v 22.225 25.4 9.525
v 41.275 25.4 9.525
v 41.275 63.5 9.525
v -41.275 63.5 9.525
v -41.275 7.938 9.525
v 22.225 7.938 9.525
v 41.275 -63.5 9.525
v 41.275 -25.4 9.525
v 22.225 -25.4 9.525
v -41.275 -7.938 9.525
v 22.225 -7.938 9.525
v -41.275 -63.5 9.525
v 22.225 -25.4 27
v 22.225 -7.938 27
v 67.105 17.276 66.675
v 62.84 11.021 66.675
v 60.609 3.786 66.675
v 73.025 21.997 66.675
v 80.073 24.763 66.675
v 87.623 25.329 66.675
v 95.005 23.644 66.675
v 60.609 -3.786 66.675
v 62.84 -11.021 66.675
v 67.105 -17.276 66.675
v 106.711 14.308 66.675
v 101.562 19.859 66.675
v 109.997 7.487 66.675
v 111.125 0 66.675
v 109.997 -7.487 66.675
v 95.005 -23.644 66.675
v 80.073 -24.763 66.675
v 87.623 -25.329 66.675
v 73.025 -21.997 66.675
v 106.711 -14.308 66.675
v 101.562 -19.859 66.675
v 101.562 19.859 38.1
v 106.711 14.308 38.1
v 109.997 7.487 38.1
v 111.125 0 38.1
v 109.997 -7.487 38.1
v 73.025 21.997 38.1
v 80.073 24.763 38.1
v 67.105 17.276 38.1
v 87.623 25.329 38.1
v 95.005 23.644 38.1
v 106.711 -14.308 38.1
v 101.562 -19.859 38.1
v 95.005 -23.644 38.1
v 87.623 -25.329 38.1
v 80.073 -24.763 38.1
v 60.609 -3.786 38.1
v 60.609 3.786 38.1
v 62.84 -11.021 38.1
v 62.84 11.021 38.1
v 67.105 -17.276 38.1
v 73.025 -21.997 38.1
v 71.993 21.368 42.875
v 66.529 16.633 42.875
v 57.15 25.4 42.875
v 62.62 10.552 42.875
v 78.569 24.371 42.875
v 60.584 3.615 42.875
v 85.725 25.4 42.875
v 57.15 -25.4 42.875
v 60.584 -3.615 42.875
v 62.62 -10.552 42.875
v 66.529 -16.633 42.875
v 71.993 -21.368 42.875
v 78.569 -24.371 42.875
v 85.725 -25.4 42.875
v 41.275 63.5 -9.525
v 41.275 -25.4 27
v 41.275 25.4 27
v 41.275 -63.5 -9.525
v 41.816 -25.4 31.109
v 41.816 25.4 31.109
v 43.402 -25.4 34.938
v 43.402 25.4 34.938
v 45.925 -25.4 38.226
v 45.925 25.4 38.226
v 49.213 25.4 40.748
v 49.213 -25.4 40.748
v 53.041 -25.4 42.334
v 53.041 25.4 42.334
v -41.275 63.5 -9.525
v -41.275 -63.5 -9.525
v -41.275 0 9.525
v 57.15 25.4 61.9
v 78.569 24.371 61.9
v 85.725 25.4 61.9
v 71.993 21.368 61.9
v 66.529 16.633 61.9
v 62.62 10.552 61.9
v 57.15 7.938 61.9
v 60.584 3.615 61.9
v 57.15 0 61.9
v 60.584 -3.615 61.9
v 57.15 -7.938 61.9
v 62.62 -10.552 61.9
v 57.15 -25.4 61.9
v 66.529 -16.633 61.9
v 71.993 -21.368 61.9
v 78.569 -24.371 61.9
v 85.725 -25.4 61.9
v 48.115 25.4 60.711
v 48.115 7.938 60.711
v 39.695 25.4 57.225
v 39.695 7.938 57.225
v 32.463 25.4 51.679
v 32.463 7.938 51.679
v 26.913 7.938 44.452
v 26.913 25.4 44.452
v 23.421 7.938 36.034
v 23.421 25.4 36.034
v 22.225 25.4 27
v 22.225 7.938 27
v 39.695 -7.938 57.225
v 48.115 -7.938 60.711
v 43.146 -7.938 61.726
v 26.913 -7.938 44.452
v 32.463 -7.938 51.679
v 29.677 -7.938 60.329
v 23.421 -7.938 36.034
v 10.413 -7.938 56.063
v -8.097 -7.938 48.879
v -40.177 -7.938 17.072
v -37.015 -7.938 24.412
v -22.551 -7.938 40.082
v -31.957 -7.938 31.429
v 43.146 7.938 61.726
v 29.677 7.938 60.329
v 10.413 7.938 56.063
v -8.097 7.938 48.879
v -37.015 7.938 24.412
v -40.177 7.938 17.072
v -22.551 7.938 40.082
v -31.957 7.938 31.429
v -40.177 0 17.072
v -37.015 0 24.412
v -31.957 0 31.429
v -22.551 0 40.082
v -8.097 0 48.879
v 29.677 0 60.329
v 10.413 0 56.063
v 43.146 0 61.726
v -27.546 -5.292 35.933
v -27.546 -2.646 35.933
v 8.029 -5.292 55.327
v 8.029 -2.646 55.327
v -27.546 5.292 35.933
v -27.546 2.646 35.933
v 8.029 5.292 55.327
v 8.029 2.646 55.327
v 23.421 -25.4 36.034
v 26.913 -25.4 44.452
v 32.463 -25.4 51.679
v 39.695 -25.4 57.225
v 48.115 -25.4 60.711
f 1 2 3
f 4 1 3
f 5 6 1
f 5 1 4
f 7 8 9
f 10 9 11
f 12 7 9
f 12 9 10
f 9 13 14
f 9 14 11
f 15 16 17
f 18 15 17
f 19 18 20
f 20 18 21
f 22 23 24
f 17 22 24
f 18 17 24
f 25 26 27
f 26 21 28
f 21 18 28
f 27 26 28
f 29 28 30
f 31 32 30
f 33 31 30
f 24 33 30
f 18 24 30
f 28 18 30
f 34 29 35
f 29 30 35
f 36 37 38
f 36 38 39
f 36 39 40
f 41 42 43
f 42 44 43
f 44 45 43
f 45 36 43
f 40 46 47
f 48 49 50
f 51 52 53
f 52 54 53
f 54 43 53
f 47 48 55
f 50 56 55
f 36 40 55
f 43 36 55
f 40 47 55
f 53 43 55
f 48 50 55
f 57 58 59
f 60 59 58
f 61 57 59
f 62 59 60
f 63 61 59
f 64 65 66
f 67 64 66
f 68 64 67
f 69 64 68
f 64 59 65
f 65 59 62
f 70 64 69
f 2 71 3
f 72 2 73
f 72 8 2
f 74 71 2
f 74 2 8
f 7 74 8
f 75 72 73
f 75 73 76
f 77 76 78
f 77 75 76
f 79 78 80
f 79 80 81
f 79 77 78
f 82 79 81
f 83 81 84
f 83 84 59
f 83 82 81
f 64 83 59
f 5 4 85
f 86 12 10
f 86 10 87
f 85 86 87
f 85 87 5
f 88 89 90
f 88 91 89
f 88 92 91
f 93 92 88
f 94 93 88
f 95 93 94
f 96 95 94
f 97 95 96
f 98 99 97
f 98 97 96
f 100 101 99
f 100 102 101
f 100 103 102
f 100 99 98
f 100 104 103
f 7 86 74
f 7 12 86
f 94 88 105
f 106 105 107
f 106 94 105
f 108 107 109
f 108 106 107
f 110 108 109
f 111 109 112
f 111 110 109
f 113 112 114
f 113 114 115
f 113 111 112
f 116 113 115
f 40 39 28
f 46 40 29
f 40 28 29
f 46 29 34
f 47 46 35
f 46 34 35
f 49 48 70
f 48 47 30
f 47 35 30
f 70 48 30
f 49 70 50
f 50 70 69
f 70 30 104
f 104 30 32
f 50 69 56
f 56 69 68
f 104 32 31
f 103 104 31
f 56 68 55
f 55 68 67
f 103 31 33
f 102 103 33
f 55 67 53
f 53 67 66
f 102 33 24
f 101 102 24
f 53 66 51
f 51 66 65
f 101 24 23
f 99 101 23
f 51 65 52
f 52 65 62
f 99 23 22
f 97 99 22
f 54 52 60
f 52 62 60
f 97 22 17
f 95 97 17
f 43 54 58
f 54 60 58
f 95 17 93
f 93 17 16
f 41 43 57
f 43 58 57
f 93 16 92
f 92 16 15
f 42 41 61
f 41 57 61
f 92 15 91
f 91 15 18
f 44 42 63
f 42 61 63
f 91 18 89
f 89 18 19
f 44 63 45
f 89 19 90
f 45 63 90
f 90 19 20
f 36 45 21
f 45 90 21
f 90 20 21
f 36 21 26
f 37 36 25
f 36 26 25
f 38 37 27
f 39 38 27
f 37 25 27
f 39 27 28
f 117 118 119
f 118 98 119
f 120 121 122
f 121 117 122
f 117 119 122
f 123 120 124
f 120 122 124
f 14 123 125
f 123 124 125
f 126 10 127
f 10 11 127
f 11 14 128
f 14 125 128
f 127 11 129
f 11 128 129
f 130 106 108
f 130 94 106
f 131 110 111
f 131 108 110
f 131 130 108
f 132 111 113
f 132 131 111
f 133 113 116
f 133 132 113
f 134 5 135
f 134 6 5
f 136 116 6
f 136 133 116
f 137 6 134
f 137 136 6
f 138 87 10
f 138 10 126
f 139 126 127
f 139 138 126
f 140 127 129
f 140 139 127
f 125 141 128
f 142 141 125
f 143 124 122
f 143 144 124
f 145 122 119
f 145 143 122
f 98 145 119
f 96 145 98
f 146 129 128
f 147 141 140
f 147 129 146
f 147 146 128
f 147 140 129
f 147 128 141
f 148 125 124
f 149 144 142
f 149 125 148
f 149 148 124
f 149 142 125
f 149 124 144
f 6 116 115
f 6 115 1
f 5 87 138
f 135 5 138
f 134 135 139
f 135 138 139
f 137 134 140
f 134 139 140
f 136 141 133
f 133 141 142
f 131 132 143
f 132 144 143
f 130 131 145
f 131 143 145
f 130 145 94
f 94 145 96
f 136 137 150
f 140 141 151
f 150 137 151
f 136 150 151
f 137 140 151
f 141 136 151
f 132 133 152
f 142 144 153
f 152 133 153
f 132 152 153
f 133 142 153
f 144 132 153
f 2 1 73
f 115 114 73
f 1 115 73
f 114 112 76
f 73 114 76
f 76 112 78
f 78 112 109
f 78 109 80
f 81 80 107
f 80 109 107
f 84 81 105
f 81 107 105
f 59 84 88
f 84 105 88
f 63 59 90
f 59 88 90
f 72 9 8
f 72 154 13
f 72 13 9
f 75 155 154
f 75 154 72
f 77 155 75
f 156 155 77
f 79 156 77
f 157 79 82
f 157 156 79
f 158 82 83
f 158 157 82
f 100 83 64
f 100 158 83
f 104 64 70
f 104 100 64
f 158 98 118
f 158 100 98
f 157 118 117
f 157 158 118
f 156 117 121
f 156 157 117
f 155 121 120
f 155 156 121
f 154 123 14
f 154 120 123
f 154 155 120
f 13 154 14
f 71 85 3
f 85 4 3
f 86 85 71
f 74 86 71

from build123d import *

# Parameters (mm, degrees)
F1_DEPTH = 63.5
F0_W     = 25.4
F0_H     = 19.0246
F2_DEPTH = 25.4
F4_DEPTH = 7.9375


# Not quite as in the source:
# - a feature names something its author has since deleted; it is built from what else it names


with BuildPart() as f1:
    # F0 (on Front) → F1 (new body, symmetric)
    with BuildSketch(Plane.XZ):
        Polygon((-41.275, -9.525), (41.275, -9.525), (41.275, 9.525), (22.225, 9.525), (-41.275, 9.525), align=None)
    extrude(amount=F1_DEPTH, both=True)

    # F0 (on Front) → F2 (join, symmetric)
    with BuildSketch(Plane.XZ):
        with BuildLine():
            Line((22.225, 9.525), (41.275, 9.525))
            Line((41.275, 9.525), (41.275, 27.0002))
            ThreePointArc((41.275, 27.0002), (45.9246798487, 38.2255201513), (57.15, 42.8752))
            Line((57.15, 42.8752), (60.325, 42.8752))
            Line((60.325, 42.8752), (60.325, 61.8998))
            Line((60.325, 61.8998), (57.15, 61.8998))
            ThreePointArc((57.15, 61.8998), (32.4632742898, 51.6794835164), (22.225, 27.0002))
            Line((22.225, 27.0002), (22.225, 9.525))
        make_face()
        with Locations((73.025, 52.3875)):
            Rectangle(F0_W, F0_H)
    extrude(amount=F2_DEPTH, both=True)

    # F0 (on Front) → F3 (revolve)
    with BuildSketch(Plane.XZ):
        Polygon((85.725, 66.675), (85.725, 61.8998), (85.725, 42.8752), (85.725, 38.1), (111.125, 38.1), (111.125, 66.675), align=None)
    revolve(axis=Axis((85.725, 0, 52.3875), (0, 0, -1)))

    # F0 (on Front) → F4 (join, symmetric)
    with BuildSketch(Plane.XZ):
        with BuildLine():
            add(Edge.make_bspline(
                [(-41.275, 9.525), (-41.2365756929, 37.5034026802), (4.0239142254, 63.6744350195), (57.15, 61.8998)],
                knots=[0, 0, 0, 0, 111.4926019969, 111.4926019969, 111.4926019969, 111.4926019969], degree=3))
            Line((-41.275, 9.525), (22.225, 9.525))
            Line((22.225, 9.525), (22.225, 27.0002))
            ThreePointArc((22.225, 27.0002), (32.4632742898, 51.6794835164), (57.15, 61.8998))
        make_face()
    extrude(amount=F4_DEPTH, both=True)


solid = f1.part
